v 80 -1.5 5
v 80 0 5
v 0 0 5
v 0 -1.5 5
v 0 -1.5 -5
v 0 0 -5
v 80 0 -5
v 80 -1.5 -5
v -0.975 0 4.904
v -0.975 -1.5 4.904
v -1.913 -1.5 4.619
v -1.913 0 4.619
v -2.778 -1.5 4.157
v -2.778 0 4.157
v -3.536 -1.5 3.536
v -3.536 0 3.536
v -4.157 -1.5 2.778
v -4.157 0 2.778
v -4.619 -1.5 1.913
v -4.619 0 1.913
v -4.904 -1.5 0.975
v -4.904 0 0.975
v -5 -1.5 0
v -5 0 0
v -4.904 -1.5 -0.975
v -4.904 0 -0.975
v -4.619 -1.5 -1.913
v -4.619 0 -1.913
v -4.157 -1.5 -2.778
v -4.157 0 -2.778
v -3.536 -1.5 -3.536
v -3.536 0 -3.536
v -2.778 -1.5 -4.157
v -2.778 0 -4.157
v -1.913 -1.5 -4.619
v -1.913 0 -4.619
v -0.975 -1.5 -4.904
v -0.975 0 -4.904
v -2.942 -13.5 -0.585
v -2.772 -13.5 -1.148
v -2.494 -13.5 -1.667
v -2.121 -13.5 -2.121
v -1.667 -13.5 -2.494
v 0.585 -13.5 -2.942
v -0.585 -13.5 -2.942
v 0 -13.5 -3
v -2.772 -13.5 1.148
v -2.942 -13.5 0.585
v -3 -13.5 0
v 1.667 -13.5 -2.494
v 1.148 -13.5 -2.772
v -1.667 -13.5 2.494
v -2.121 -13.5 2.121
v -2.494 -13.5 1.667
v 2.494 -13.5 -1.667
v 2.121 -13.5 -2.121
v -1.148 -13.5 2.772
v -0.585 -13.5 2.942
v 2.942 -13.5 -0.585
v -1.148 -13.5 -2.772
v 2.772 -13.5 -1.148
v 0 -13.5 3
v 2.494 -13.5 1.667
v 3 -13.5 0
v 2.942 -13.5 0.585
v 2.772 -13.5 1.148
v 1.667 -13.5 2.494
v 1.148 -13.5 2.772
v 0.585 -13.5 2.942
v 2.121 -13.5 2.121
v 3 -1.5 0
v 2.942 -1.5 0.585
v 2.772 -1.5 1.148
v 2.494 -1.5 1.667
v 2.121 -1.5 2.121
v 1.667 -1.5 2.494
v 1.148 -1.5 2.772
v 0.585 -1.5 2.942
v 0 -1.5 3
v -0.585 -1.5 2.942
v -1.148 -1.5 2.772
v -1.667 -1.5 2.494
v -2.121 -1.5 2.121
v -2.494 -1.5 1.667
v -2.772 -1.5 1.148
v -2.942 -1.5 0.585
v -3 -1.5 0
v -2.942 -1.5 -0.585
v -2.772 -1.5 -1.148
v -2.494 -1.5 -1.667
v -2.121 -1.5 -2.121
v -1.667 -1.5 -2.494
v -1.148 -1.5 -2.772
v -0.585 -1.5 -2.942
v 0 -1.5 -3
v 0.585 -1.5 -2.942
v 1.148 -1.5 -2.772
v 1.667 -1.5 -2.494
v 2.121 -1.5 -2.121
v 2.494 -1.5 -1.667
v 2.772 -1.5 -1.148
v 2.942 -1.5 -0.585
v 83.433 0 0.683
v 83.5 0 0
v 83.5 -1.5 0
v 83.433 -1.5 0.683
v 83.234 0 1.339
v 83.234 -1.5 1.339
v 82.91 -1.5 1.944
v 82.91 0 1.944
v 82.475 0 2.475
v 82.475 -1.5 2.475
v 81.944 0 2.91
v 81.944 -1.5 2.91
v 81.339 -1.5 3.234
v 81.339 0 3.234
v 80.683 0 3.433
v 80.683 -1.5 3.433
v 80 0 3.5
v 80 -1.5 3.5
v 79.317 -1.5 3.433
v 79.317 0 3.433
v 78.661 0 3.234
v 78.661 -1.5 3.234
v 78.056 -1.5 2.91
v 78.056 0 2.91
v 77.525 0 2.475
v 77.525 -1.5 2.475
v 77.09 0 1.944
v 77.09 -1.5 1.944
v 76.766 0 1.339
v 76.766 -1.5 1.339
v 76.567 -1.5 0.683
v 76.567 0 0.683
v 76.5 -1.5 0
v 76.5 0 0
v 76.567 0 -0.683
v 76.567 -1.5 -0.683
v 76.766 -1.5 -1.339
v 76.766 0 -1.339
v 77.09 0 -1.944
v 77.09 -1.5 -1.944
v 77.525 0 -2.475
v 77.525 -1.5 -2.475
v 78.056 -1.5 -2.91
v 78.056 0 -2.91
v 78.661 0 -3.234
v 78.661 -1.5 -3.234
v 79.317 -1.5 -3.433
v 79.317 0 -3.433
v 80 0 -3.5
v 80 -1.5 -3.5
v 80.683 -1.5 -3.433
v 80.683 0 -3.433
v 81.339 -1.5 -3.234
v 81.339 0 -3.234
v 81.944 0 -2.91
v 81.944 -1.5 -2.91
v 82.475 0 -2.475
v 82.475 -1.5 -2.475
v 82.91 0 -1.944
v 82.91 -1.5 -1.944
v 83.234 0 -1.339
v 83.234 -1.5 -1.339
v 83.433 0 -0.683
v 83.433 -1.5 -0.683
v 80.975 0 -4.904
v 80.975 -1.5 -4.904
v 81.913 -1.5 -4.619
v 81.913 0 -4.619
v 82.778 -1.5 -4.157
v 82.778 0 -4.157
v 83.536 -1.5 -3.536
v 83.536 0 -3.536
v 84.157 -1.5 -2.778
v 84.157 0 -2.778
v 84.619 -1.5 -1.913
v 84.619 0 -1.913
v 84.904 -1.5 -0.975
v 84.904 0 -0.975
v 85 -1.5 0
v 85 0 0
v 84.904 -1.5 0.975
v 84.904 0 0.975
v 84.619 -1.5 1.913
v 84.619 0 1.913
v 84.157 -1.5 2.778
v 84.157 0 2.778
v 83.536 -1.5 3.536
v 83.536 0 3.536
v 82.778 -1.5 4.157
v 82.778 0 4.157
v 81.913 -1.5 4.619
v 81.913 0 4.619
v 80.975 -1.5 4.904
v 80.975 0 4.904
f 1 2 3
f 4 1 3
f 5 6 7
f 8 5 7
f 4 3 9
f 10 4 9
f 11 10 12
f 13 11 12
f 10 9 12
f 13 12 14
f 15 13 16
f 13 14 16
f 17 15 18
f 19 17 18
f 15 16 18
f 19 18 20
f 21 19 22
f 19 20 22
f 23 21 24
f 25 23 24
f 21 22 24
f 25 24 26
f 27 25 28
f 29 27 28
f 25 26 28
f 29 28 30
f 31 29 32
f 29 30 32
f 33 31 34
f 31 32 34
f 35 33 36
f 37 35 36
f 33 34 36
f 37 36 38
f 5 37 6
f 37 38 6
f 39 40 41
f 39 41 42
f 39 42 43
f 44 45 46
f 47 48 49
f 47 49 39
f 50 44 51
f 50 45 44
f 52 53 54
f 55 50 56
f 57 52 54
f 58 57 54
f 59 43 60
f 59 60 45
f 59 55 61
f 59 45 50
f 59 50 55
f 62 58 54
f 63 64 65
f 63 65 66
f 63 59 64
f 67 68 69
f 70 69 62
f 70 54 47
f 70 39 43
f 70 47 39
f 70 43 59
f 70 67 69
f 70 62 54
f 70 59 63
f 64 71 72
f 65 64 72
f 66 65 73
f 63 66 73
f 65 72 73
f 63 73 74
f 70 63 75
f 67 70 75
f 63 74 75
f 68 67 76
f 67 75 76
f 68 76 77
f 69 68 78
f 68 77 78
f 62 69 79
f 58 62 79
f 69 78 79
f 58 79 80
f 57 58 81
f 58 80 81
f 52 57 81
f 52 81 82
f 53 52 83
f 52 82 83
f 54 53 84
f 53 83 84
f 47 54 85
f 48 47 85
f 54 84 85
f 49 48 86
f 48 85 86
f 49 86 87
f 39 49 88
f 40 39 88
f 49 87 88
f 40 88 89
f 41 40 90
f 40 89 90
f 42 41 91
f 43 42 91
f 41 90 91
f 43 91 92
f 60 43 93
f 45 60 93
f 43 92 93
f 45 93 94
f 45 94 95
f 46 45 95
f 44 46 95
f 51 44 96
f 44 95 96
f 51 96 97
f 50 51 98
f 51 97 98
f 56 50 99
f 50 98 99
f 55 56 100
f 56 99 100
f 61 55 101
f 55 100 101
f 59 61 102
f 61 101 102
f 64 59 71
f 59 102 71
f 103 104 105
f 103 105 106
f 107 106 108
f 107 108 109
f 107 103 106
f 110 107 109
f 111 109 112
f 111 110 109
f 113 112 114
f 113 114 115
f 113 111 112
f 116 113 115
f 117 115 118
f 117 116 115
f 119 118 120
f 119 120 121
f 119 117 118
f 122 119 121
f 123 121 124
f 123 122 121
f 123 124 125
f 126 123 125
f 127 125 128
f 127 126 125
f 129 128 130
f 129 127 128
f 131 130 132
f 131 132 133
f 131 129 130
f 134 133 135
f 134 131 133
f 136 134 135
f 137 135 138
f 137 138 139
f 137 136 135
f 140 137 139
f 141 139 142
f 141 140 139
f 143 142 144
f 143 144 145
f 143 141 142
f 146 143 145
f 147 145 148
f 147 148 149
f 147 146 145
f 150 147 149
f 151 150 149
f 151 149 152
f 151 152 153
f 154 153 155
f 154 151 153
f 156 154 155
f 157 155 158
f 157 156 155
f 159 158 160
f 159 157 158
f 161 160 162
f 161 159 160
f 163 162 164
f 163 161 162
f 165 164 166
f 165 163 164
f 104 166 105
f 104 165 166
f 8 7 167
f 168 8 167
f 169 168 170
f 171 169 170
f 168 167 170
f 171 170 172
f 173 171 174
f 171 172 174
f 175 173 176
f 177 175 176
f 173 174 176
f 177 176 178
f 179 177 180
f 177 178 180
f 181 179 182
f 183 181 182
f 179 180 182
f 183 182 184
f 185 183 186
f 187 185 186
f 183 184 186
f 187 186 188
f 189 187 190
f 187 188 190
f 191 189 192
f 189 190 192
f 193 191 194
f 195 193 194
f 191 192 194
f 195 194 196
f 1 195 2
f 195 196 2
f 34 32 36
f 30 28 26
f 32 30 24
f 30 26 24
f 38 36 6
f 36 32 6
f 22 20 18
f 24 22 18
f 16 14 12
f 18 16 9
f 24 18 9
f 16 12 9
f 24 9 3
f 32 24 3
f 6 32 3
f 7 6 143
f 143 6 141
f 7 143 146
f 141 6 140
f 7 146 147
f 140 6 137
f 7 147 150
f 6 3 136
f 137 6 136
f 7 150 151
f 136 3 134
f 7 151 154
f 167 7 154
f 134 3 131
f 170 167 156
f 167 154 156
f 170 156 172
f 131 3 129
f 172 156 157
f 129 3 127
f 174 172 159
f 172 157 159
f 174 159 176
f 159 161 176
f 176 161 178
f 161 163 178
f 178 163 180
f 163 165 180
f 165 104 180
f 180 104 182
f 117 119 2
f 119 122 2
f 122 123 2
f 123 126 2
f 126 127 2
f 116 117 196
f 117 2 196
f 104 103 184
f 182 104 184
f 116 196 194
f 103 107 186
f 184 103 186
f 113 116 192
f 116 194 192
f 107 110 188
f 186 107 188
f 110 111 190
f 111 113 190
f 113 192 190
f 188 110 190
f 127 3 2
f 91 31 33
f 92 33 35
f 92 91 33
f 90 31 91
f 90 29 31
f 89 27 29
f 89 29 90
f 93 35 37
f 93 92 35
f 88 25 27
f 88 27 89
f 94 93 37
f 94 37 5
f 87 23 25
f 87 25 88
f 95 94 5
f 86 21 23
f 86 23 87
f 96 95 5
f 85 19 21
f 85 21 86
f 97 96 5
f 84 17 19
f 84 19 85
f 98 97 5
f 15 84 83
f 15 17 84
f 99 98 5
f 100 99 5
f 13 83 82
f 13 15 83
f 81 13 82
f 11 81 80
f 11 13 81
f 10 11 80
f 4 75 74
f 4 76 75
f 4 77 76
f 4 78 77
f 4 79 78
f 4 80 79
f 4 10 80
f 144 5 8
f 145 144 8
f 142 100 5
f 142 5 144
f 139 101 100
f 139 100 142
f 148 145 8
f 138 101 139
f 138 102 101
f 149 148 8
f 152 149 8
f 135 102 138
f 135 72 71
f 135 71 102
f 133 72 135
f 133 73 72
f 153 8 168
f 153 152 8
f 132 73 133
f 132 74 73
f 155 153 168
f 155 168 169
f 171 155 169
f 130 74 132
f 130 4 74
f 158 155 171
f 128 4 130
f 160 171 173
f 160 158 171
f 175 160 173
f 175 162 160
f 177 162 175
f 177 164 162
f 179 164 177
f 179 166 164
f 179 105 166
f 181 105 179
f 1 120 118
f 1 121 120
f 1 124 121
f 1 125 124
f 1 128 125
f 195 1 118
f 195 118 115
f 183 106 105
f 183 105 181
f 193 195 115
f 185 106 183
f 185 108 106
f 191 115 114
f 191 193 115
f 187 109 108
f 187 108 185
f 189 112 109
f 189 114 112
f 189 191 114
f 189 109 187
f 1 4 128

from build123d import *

# Parameters (mm, degrees)
F0_R     = 3.5
F1_DEPTH = 1.5
F2_R     = 3
F3_DEPTH = 12


with BuildPart() as f1:
    # F0 (on Front) → F1 (new body)
    with BuildSketch(Plane.XZ):
        with BuildLine():
            Line((80, 5), (0, 5))
            ThreePointArc((0, 5), (-5, 0), (0, -5))
            Line((0, -5), (80, -5))
            ThreePointArc((80, -5), (85, 0), (80, 5))
        make_face()
        with Locations((80, 0)):
            Circle(F0_R, mode=Mode.SUBTRACT)
    extrude(amount=F1_DEPTH)

    # F2 (on face) → F3 (join)
    with BuildSketch(Plane.XZ.offset(1.5)):
        Circle(F2_R)
    extrude(amount=F3_DEPTH)


solid = f1.part
